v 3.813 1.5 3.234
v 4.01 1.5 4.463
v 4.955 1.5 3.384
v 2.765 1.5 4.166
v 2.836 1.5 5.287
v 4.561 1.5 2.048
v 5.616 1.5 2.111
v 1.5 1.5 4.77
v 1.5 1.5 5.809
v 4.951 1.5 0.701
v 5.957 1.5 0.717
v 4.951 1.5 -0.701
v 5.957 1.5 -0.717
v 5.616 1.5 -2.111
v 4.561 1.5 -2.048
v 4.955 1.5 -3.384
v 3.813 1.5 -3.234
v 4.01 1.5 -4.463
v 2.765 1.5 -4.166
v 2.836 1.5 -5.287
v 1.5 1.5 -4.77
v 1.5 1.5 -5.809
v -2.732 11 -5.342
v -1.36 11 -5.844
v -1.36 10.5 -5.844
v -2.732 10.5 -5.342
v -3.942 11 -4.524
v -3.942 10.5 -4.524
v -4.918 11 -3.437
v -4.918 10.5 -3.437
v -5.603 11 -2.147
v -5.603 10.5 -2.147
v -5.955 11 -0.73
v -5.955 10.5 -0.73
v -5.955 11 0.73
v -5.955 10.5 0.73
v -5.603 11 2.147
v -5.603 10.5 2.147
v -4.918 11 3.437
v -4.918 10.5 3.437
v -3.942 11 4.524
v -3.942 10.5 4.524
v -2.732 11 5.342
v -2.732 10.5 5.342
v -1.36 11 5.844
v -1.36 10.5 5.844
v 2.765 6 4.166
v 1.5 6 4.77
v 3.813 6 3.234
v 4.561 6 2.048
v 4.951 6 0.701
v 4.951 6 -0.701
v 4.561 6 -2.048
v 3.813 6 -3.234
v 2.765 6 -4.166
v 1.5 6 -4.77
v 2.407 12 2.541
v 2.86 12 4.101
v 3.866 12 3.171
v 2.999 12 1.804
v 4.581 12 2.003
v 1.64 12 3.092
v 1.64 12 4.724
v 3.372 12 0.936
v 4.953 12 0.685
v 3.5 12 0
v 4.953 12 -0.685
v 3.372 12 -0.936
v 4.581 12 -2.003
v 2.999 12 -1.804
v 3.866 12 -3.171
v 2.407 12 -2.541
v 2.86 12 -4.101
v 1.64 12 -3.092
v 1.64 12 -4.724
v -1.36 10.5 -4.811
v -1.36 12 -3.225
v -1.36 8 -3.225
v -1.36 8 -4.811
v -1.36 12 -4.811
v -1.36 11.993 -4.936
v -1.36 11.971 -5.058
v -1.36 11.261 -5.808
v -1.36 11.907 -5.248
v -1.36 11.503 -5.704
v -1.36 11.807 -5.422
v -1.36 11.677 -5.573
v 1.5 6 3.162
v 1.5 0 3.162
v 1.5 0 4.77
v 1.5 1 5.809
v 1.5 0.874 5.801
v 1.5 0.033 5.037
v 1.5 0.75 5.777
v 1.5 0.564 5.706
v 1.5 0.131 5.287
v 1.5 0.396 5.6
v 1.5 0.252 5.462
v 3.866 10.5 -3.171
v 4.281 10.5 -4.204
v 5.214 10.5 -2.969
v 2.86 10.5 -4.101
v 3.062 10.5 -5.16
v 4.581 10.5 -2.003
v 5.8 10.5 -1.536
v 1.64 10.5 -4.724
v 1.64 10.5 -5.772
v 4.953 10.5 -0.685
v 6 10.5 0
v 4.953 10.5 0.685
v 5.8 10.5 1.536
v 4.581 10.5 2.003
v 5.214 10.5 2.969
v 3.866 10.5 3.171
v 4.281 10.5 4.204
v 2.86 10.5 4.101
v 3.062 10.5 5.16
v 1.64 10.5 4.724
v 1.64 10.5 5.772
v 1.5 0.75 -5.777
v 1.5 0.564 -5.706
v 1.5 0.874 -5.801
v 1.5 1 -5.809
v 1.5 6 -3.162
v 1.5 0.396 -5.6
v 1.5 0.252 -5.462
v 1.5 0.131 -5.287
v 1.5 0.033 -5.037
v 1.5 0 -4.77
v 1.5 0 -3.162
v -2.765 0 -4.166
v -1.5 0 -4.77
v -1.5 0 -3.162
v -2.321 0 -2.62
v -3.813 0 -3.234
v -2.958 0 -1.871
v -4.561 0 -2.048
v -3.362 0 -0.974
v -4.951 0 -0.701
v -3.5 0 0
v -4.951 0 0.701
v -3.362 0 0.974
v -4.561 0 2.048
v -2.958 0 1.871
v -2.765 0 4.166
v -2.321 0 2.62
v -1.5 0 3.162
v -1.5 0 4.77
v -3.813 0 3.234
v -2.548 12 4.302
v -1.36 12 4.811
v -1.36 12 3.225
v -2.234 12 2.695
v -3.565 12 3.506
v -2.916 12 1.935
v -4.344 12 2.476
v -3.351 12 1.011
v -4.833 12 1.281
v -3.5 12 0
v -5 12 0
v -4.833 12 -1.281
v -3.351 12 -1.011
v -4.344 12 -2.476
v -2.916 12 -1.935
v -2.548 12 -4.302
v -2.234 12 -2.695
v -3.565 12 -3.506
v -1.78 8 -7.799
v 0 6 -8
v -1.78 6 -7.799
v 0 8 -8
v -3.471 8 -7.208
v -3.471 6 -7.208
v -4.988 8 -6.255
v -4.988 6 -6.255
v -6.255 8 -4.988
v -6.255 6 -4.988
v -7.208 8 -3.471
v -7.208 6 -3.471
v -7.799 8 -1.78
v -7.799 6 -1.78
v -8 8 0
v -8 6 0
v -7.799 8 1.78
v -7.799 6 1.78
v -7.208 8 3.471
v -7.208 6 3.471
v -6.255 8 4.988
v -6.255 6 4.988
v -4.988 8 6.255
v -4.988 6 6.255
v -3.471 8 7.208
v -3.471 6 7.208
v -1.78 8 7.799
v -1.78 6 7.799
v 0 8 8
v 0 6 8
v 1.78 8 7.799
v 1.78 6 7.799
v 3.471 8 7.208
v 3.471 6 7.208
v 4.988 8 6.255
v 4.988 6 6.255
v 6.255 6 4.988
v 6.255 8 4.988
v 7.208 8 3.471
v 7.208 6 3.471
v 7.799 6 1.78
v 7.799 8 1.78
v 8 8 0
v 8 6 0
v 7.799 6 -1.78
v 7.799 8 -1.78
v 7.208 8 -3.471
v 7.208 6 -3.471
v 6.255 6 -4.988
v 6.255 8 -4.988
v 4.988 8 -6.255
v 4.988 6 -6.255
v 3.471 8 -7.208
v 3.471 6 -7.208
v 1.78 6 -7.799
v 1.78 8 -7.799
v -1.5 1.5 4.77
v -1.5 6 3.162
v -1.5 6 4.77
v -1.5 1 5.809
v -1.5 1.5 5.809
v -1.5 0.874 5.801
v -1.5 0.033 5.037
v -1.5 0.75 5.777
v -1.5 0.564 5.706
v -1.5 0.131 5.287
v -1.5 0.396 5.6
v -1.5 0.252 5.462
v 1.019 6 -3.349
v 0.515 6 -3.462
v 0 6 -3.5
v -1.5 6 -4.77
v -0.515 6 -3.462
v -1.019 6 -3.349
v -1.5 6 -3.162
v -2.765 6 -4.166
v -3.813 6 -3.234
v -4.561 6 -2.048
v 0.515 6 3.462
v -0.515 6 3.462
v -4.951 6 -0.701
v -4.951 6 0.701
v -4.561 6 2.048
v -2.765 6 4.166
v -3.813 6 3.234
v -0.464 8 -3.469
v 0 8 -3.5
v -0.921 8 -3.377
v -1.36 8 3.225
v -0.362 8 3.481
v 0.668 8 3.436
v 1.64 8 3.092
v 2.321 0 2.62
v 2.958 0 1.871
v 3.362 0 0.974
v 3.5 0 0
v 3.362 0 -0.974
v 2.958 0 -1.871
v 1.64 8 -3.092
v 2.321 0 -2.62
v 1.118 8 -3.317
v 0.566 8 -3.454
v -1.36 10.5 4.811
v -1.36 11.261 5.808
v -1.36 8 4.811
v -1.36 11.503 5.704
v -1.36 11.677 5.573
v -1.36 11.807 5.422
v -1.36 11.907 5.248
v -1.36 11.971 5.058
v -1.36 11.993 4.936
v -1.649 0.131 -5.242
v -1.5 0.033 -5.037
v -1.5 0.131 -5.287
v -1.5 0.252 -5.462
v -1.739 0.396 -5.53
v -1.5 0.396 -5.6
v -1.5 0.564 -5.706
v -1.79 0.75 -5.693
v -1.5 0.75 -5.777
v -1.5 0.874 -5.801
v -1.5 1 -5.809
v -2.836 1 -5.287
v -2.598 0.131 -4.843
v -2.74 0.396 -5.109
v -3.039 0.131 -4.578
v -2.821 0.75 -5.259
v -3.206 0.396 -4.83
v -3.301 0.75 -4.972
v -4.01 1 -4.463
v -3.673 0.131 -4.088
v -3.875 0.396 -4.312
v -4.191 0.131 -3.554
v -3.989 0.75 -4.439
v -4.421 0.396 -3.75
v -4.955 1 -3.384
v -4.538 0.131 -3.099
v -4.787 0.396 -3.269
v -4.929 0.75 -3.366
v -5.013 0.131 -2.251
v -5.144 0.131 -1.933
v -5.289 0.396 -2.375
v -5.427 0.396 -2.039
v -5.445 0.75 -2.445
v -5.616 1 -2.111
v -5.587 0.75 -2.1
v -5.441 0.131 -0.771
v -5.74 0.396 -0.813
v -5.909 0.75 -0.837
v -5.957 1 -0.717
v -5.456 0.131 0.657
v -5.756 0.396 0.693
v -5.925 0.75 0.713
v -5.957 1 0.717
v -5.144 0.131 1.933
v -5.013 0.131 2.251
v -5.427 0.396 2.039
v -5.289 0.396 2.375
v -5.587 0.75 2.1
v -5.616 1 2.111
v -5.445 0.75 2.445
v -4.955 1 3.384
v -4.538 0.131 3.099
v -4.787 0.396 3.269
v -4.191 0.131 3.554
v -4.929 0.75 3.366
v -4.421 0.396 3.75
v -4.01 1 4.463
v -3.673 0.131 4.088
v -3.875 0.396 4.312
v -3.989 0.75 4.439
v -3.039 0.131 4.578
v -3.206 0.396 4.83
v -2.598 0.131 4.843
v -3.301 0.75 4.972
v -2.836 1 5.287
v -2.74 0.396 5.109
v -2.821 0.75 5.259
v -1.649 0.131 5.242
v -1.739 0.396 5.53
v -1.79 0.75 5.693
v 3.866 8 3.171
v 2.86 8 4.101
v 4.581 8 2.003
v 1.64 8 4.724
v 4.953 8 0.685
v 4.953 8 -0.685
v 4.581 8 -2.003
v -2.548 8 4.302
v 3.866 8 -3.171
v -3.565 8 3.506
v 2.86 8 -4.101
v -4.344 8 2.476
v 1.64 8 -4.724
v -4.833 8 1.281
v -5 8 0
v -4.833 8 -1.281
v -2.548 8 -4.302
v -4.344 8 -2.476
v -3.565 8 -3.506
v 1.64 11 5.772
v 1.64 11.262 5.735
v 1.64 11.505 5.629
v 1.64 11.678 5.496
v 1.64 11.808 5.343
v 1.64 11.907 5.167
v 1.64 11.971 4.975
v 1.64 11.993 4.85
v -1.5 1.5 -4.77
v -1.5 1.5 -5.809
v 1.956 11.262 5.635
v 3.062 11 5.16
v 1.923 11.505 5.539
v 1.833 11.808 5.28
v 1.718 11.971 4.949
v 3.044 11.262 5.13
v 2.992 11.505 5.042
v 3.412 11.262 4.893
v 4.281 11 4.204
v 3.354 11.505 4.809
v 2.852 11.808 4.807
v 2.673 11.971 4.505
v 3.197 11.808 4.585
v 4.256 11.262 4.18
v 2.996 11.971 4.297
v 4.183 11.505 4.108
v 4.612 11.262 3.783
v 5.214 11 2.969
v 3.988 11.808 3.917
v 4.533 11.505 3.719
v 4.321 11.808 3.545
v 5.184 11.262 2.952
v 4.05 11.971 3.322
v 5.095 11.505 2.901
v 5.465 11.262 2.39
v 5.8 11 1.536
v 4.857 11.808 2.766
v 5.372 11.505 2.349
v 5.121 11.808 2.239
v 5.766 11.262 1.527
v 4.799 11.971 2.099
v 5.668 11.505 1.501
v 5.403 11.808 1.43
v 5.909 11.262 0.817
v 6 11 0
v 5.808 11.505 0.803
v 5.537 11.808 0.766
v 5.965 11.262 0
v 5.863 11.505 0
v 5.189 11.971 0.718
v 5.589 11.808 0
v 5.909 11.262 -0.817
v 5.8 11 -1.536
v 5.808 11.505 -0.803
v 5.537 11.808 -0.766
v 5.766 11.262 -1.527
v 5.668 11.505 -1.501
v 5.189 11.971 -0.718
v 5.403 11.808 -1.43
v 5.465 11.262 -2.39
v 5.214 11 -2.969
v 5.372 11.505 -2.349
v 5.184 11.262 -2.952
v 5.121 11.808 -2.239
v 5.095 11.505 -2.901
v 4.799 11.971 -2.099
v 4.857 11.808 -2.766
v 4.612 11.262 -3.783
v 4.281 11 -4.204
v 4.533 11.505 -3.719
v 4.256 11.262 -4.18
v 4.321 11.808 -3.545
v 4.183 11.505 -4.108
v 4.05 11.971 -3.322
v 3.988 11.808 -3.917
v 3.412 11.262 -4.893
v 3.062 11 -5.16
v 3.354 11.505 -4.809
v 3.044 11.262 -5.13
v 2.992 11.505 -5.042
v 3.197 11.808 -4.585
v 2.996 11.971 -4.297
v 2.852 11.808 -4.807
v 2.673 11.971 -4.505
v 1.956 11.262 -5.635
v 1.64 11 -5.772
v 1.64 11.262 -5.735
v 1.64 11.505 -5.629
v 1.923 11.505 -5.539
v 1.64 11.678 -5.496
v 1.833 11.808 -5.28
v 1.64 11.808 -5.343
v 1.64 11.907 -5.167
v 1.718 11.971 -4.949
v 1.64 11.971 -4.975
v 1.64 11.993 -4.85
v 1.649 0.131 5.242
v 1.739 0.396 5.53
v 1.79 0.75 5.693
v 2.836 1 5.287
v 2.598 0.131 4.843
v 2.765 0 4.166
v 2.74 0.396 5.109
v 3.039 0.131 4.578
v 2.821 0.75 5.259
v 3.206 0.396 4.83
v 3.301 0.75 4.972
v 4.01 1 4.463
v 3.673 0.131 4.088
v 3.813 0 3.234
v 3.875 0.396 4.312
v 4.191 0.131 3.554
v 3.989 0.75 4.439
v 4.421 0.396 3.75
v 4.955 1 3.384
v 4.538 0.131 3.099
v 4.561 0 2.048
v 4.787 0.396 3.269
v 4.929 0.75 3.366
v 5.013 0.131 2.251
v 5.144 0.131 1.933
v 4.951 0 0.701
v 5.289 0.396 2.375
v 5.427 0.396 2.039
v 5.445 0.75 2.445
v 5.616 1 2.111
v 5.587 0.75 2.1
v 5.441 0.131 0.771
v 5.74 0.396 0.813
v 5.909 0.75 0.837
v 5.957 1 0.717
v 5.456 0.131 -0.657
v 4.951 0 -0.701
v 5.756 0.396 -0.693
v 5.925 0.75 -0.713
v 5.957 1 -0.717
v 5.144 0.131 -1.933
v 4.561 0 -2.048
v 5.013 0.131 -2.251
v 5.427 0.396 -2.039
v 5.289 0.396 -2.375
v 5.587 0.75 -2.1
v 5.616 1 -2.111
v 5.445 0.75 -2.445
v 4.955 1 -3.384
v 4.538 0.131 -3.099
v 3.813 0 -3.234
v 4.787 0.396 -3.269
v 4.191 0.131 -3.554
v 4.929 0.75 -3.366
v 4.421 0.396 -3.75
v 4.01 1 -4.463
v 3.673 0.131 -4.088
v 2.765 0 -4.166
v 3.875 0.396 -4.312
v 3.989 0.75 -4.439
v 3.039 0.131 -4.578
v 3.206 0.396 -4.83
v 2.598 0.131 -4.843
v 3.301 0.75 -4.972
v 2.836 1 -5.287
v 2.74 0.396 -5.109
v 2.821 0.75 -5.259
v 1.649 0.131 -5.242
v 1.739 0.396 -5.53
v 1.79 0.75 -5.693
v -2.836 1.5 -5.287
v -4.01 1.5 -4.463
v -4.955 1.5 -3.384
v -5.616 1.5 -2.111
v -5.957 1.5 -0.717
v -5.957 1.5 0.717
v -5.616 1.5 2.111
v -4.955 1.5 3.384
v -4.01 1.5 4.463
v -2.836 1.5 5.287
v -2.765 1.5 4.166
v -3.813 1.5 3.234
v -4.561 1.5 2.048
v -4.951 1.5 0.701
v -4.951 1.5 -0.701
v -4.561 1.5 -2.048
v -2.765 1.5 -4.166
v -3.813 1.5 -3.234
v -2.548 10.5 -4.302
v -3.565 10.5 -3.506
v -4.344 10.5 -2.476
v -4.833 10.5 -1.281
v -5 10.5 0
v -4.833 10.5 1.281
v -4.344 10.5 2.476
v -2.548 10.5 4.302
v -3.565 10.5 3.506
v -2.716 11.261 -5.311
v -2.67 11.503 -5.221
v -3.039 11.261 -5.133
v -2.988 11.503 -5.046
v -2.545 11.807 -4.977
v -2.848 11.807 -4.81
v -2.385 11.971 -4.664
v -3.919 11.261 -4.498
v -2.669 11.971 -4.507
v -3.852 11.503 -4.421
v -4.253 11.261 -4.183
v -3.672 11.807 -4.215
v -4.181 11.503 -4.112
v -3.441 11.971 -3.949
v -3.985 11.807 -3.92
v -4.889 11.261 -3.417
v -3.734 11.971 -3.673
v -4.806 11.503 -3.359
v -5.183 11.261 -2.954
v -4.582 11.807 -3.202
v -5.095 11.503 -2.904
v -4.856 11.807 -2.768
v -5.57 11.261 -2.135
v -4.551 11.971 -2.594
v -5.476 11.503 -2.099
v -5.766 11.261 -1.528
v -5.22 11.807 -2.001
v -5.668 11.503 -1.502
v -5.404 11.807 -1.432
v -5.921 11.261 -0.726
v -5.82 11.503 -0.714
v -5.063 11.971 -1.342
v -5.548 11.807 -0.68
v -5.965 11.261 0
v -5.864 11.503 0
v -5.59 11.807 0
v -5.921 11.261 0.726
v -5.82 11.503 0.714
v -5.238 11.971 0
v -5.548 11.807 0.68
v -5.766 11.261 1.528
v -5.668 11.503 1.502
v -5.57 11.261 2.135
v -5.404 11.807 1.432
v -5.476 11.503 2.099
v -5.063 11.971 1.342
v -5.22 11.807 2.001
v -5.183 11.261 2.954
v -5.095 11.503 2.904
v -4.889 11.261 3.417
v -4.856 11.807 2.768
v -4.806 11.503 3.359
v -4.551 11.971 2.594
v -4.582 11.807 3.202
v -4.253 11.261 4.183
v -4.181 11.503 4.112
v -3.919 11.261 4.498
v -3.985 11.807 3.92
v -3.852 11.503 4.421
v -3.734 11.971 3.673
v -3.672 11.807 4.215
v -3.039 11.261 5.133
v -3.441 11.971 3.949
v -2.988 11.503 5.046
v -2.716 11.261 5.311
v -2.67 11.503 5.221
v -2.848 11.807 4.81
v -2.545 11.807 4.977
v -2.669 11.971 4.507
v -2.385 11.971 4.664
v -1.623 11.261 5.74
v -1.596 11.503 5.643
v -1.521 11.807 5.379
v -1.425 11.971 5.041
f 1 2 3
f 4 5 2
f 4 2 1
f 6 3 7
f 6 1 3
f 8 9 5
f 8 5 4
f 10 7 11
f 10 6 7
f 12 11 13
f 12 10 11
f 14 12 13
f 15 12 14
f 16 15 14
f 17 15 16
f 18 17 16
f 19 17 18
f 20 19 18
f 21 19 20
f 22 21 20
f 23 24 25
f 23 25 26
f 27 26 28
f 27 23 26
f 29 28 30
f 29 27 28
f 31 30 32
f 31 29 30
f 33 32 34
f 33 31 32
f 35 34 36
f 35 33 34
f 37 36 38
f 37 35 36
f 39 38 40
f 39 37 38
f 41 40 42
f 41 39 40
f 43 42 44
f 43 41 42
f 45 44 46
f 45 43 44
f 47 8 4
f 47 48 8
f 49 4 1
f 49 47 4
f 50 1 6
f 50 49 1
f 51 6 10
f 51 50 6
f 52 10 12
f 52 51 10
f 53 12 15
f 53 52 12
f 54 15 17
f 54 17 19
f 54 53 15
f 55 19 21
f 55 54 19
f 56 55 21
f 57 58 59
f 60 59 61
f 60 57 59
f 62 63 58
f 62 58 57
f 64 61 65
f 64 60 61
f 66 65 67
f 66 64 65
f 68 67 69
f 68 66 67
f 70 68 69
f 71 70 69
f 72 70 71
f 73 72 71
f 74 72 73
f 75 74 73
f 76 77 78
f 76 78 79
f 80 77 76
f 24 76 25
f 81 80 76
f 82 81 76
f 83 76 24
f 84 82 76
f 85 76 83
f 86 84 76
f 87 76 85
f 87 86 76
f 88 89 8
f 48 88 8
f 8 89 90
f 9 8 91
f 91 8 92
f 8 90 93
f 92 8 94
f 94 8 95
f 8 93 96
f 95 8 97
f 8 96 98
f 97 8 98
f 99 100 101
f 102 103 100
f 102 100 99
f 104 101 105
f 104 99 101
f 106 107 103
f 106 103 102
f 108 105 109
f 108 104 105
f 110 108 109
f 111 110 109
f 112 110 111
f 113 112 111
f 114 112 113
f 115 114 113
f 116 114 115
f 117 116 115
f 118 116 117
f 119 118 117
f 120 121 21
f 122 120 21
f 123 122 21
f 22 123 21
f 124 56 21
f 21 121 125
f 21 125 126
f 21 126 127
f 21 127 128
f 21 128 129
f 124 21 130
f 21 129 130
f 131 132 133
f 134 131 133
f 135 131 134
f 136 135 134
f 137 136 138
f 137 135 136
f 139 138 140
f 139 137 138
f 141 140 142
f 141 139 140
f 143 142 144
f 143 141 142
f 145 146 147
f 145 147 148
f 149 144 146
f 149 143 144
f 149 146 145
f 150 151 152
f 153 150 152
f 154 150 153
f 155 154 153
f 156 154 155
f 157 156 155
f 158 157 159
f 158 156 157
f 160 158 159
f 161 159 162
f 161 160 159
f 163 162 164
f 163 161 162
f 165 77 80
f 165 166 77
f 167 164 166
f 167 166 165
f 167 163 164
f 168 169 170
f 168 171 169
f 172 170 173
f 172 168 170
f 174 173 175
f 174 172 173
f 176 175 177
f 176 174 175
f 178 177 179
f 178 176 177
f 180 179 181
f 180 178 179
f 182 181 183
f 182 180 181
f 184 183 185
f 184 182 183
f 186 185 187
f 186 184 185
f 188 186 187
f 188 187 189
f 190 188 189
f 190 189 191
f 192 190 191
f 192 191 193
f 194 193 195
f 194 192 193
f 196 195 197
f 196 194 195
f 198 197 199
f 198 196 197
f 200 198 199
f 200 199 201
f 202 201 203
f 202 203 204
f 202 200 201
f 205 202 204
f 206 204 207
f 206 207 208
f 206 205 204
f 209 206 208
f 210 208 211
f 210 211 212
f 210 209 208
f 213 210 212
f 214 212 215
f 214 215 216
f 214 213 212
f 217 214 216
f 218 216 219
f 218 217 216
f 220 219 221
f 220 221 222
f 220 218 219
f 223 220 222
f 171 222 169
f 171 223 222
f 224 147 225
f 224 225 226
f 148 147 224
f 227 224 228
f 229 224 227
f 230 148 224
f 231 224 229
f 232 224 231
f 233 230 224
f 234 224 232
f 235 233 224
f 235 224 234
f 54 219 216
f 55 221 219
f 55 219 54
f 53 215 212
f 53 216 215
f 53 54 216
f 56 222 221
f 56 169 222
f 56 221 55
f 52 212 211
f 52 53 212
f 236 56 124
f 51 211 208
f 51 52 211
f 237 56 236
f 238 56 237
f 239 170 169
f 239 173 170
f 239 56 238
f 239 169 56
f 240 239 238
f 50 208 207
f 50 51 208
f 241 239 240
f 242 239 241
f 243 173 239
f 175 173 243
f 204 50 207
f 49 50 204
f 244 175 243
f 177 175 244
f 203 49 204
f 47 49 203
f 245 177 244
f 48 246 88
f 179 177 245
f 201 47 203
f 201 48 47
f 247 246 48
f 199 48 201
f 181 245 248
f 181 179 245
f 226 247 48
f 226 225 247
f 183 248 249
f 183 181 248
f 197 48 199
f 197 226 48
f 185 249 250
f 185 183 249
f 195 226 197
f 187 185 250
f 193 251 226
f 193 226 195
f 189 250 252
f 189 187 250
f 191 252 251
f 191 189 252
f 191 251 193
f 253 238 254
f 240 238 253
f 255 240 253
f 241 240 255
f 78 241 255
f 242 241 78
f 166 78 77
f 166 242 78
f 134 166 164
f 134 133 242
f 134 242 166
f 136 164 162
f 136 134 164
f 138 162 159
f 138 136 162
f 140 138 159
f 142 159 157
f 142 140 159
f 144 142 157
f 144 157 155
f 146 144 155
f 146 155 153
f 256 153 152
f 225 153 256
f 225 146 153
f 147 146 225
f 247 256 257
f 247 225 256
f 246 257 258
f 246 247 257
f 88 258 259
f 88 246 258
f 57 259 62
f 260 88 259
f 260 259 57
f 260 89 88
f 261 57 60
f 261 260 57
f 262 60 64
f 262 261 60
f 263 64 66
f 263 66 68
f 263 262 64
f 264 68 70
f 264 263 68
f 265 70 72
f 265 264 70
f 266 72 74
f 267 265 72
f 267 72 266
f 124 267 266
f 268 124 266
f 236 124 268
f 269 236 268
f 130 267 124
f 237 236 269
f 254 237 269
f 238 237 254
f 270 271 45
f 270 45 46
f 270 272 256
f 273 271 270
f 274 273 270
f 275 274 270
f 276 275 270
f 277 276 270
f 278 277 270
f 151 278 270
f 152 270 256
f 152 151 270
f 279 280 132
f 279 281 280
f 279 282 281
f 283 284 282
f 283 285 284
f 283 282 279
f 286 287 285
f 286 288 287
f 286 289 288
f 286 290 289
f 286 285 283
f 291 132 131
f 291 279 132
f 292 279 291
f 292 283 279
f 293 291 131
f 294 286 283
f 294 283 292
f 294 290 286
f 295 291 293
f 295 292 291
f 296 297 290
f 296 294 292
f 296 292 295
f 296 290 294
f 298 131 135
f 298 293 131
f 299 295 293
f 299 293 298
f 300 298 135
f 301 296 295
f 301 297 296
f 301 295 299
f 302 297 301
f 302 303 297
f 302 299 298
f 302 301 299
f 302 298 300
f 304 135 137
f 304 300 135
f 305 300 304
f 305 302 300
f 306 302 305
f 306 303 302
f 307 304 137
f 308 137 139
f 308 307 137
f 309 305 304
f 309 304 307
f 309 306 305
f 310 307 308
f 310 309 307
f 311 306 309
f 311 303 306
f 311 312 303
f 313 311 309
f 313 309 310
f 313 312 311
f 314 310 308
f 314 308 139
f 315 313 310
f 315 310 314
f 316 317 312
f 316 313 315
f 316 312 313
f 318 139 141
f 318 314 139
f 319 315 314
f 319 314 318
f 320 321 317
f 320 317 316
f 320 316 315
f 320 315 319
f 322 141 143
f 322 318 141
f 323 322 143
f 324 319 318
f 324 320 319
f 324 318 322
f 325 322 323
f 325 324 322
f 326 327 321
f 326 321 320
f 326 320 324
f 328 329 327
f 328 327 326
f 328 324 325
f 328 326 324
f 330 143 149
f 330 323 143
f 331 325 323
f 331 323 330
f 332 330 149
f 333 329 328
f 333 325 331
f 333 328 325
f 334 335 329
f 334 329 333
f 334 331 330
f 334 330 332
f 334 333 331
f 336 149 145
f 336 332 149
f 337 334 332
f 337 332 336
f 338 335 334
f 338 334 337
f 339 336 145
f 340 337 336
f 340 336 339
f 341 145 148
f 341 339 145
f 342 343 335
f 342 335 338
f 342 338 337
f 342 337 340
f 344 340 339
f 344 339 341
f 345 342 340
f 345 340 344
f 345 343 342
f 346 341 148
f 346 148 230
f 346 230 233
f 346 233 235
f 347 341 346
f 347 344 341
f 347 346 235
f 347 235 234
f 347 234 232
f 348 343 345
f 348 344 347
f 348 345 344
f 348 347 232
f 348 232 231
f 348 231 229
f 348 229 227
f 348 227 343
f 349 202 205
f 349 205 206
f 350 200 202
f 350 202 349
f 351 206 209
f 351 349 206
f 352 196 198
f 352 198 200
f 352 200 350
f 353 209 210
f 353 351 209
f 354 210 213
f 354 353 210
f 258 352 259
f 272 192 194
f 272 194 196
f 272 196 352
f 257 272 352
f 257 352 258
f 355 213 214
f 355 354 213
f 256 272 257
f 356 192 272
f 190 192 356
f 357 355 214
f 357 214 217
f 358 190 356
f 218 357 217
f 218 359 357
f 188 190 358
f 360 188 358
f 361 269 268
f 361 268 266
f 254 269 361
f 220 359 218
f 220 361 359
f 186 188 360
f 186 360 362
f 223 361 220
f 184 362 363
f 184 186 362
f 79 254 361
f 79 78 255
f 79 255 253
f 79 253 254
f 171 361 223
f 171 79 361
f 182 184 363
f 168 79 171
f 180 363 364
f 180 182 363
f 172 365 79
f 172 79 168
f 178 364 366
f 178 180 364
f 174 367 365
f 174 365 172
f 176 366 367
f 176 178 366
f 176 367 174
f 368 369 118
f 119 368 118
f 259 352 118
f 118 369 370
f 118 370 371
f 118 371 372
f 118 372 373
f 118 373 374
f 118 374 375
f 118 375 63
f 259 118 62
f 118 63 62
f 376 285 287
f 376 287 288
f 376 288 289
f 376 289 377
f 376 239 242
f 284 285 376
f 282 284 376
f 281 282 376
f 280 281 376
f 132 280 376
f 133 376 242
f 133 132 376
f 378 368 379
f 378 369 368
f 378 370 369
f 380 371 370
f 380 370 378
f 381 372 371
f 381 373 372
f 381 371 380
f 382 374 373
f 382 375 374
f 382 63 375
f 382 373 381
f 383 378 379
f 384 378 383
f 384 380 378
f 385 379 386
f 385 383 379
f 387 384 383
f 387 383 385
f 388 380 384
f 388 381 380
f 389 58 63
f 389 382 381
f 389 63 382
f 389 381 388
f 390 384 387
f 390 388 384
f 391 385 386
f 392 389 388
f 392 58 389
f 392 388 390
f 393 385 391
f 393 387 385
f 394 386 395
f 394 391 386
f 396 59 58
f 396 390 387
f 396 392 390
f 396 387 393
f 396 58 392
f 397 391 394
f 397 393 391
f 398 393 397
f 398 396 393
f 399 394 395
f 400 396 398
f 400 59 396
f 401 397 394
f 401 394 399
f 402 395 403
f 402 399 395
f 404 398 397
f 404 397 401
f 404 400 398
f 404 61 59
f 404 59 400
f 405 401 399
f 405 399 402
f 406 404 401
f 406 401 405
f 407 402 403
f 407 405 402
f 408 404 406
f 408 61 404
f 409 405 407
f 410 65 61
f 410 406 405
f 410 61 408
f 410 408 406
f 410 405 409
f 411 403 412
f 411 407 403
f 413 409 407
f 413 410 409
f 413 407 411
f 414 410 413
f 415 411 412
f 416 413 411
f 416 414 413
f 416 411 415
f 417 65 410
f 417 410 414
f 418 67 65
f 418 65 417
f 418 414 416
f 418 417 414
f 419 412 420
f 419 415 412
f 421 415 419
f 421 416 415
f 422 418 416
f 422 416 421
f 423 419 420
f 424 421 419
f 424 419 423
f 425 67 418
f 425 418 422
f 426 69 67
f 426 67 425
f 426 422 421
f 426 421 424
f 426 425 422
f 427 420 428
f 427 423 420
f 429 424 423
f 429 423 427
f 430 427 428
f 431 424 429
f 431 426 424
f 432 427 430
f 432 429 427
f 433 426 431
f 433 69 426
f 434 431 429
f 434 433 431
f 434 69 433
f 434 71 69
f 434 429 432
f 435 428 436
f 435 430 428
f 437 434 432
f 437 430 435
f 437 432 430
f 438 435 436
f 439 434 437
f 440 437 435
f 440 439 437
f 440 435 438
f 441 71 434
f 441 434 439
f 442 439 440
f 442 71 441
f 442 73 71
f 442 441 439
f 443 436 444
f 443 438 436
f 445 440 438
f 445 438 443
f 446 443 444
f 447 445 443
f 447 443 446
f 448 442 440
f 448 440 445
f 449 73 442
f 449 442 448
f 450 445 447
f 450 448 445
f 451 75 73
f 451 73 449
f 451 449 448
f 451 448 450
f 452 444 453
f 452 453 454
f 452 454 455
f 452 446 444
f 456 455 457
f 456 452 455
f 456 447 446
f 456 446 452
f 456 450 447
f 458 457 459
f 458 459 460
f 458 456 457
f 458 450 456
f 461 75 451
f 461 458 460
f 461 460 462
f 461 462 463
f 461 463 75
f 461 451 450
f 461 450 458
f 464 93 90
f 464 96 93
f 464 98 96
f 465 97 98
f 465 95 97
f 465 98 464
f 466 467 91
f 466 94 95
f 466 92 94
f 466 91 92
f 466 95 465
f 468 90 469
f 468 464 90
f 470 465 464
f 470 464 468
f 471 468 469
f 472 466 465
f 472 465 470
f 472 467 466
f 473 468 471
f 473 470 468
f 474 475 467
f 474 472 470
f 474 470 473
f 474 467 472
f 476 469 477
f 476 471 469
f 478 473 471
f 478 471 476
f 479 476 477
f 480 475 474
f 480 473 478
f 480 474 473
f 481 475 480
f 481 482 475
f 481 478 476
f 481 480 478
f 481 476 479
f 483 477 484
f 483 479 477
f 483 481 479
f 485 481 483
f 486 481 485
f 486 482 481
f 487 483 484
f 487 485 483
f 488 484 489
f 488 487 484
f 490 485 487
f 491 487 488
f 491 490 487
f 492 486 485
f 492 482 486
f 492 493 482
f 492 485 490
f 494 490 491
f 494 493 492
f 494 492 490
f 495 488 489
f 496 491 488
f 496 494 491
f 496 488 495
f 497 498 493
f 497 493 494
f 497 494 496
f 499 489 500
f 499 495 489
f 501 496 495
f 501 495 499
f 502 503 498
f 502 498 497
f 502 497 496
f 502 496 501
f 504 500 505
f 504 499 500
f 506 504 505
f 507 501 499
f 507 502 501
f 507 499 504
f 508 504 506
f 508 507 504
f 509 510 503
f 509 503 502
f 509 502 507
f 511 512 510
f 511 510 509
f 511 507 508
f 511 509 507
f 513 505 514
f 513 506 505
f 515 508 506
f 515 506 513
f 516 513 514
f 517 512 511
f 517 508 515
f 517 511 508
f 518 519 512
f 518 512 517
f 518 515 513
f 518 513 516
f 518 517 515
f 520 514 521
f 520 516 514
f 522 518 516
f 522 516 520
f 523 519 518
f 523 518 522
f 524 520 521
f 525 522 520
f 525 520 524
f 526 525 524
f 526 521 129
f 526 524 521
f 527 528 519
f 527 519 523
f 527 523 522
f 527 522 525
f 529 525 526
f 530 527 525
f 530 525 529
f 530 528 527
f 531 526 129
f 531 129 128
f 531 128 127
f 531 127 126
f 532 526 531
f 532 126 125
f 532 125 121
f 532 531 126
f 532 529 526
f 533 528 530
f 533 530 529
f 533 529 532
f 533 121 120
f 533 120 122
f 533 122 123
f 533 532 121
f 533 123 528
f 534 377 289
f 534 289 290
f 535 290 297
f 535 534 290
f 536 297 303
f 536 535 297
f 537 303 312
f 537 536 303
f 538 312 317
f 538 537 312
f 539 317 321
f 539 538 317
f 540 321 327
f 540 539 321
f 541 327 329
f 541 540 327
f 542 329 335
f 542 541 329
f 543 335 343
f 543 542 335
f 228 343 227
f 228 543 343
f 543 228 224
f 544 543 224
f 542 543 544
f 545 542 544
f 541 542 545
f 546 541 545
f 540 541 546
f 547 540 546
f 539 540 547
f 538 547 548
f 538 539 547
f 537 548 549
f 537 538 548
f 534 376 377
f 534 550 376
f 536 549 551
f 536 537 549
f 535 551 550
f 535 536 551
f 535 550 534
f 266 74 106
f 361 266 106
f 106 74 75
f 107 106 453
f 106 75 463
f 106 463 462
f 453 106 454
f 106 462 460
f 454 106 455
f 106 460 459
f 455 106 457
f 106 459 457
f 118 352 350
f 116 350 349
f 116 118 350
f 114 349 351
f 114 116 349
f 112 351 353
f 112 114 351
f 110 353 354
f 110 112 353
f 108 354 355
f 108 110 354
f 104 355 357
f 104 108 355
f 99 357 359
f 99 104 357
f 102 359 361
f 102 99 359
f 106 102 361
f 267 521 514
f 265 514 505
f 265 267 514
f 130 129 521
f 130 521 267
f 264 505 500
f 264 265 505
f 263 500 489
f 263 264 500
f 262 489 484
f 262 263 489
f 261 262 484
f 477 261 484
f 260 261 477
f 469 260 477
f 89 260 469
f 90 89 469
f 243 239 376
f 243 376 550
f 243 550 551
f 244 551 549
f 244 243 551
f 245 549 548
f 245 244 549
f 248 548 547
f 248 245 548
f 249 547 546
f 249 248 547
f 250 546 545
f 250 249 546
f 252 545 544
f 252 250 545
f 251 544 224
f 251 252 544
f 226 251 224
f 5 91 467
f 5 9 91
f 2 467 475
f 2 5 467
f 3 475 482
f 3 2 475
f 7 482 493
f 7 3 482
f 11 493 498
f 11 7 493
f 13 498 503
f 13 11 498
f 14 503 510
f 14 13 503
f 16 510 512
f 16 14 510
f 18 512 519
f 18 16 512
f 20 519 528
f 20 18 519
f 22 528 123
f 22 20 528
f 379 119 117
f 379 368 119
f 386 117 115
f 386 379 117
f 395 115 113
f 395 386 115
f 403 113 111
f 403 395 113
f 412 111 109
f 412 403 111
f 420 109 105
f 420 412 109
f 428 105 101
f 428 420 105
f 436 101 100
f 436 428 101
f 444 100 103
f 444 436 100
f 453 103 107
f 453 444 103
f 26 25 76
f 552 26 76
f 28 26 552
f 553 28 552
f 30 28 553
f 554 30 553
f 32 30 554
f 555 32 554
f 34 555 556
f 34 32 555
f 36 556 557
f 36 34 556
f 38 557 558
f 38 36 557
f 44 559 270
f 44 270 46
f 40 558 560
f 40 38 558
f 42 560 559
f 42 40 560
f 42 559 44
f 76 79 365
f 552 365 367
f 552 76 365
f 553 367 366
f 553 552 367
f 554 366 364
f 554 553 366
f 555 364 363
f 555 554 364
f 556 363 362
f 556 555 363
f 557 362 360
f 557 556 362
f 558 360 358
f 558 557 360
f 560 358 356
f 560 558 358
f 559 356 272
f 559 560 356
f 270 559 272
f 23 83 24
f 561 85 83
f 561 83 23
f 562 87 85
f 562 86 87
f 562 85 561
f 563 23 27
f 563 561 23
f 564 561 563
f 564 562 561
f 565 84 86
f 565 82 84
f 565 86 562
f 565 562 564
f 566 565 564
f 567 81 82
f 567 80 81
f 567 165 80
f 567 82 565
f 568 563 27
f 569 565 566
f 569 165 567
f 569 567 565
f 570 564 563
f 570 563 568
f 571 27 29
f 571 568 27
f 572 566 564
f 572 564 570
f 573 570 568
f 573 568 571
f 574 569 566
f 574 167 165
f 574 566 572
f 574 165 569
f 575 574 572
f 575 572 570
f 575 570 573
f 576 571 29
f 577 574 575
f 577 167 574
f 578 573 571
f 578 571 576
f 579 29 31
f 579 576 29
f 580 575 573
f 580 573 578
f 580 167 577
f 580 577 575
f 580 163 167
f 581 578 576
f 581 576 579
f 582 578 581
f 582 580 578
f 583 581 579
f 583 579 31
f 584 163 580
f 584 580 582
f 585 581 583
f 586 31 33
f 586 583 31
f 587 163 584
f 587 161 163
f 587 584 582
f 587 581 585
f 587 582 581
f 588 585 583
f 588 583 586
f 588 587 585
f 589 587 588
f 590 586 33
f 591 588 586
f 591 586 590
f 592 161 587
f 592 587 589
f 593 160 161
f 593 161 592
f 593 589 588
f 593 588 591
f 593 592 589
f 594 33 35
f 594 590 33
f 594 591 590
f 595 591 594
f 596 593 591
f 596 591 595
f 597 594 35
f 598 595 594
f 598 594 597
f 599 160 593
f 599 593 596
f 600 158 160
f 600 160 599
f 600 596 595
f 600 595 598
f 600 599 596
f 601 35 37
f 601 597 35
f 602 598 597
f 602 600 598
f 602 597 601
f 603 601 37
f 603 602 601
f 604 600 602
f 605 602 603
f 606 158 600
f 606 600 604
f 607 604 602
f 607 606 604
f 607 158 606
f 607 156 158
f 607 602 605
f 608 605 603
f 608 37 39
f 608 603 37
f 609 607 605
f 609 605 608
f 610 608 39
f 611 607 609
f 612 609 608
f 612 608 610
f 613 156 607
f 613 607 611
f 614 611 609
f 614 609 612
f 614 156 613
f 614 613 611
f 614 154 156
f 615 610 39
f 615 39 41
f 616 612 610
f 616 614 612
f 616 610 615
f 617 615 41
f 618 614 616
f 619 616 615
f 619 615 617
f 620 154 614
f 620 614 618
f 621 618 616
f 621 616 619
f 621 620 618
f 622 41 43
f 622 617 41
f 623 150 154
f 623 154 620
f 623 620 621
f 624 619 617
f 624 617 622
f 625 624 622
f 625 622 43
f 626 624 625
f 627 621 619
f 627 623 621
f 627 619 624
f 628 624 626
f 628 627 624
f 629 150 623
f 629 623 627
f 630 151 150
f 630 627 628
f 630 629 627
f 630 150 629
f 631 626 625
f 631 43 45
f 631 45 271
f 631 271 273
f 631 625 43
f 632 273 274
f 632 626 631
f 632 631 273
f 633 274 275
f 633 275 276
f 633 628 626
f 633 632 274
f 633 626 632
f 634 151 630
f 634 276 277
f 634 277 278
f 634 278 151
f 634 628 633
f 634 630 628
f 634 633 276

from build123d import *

# Parameters (mm, degrees)
ESQUISSE2_W             = 3
ESQUISSE2_H             = 13.00905209
ENL_V_MAT_EXTRU_1_DEPTH = 4
ESQUISSE3_W             = 3
ESQUISSE3_H             = 13.12821898
ENL_V_MAT_EXTRU_2_DEPTH = 6


with BuildPart() as part:
    # Esquisse1 → Révolution2 (revolve)
    with BuildSketch(Plane.XY, mode=Mode.PRIVATE) as r_volution2_sk:
        with BuildLine():
            Line((-5, 1.5), (-5, 6))
            Line((-5, 6), (-8, 6))
            Line((-8, 6), (-8, 8))
            Line((-8, 8), (-5, 8))
            Line((-5, 8), (-5, 10.5))
            Line((-5, 10.5), (-6, 10.5))
            Line((-6, 10.5), (-6, 11))
            ThreePointArc((-6, 11), (-5.707106781, 11.707106781), (-5, 12))
            Line((-5, 12), (-3.5, 12))
            Line((-3.5, 12), (-3.5, 0))
            Line((-3.5, 0), (-5, 0))
            ThreePointArc((-5, 0), (-5.707106781, 0.292893219), (-6, 1))
            Line((-6, 1), (-6, 1.5))
            Line((-6, 1.5), (-5, 1.5))
        make_face()
    revolve(r_volution2_sk.sketch.rotate(Axis((0, 12, 0), (0, 1, 0)), 270), axis=Axis((0, 12, 0), (0, 1, 0)))

    # Esquisse2 → Enlèv. mat.-Extru.1 (cut)
    with BuildSketch(Plane(origin=(0, 12, 0), x_dir=(1, 0, 0), z_dir=(0, 1, 0))):
        with Locations((0.139511346, 0)):
            Rectangle(ESQUISSE2_W, ESQUISSE2_H)
    extrude(amount=-ENL_V_MAT_EXTRU_1_DEPTH, mode=Mode.SUBTRACT)

    # Esquisse3 → Enlèv. mat.-Extru.2 (cut)
    with BuildSketch(Plane.XZ):
        Rectangle(ESQUISSE3_W, ESQUISSE3_H)
    extrude(amount=-ENL_V_MAT_EXTRU_2_DEPTH, mode=Mode.SUBTRACT)


solid = part.part
